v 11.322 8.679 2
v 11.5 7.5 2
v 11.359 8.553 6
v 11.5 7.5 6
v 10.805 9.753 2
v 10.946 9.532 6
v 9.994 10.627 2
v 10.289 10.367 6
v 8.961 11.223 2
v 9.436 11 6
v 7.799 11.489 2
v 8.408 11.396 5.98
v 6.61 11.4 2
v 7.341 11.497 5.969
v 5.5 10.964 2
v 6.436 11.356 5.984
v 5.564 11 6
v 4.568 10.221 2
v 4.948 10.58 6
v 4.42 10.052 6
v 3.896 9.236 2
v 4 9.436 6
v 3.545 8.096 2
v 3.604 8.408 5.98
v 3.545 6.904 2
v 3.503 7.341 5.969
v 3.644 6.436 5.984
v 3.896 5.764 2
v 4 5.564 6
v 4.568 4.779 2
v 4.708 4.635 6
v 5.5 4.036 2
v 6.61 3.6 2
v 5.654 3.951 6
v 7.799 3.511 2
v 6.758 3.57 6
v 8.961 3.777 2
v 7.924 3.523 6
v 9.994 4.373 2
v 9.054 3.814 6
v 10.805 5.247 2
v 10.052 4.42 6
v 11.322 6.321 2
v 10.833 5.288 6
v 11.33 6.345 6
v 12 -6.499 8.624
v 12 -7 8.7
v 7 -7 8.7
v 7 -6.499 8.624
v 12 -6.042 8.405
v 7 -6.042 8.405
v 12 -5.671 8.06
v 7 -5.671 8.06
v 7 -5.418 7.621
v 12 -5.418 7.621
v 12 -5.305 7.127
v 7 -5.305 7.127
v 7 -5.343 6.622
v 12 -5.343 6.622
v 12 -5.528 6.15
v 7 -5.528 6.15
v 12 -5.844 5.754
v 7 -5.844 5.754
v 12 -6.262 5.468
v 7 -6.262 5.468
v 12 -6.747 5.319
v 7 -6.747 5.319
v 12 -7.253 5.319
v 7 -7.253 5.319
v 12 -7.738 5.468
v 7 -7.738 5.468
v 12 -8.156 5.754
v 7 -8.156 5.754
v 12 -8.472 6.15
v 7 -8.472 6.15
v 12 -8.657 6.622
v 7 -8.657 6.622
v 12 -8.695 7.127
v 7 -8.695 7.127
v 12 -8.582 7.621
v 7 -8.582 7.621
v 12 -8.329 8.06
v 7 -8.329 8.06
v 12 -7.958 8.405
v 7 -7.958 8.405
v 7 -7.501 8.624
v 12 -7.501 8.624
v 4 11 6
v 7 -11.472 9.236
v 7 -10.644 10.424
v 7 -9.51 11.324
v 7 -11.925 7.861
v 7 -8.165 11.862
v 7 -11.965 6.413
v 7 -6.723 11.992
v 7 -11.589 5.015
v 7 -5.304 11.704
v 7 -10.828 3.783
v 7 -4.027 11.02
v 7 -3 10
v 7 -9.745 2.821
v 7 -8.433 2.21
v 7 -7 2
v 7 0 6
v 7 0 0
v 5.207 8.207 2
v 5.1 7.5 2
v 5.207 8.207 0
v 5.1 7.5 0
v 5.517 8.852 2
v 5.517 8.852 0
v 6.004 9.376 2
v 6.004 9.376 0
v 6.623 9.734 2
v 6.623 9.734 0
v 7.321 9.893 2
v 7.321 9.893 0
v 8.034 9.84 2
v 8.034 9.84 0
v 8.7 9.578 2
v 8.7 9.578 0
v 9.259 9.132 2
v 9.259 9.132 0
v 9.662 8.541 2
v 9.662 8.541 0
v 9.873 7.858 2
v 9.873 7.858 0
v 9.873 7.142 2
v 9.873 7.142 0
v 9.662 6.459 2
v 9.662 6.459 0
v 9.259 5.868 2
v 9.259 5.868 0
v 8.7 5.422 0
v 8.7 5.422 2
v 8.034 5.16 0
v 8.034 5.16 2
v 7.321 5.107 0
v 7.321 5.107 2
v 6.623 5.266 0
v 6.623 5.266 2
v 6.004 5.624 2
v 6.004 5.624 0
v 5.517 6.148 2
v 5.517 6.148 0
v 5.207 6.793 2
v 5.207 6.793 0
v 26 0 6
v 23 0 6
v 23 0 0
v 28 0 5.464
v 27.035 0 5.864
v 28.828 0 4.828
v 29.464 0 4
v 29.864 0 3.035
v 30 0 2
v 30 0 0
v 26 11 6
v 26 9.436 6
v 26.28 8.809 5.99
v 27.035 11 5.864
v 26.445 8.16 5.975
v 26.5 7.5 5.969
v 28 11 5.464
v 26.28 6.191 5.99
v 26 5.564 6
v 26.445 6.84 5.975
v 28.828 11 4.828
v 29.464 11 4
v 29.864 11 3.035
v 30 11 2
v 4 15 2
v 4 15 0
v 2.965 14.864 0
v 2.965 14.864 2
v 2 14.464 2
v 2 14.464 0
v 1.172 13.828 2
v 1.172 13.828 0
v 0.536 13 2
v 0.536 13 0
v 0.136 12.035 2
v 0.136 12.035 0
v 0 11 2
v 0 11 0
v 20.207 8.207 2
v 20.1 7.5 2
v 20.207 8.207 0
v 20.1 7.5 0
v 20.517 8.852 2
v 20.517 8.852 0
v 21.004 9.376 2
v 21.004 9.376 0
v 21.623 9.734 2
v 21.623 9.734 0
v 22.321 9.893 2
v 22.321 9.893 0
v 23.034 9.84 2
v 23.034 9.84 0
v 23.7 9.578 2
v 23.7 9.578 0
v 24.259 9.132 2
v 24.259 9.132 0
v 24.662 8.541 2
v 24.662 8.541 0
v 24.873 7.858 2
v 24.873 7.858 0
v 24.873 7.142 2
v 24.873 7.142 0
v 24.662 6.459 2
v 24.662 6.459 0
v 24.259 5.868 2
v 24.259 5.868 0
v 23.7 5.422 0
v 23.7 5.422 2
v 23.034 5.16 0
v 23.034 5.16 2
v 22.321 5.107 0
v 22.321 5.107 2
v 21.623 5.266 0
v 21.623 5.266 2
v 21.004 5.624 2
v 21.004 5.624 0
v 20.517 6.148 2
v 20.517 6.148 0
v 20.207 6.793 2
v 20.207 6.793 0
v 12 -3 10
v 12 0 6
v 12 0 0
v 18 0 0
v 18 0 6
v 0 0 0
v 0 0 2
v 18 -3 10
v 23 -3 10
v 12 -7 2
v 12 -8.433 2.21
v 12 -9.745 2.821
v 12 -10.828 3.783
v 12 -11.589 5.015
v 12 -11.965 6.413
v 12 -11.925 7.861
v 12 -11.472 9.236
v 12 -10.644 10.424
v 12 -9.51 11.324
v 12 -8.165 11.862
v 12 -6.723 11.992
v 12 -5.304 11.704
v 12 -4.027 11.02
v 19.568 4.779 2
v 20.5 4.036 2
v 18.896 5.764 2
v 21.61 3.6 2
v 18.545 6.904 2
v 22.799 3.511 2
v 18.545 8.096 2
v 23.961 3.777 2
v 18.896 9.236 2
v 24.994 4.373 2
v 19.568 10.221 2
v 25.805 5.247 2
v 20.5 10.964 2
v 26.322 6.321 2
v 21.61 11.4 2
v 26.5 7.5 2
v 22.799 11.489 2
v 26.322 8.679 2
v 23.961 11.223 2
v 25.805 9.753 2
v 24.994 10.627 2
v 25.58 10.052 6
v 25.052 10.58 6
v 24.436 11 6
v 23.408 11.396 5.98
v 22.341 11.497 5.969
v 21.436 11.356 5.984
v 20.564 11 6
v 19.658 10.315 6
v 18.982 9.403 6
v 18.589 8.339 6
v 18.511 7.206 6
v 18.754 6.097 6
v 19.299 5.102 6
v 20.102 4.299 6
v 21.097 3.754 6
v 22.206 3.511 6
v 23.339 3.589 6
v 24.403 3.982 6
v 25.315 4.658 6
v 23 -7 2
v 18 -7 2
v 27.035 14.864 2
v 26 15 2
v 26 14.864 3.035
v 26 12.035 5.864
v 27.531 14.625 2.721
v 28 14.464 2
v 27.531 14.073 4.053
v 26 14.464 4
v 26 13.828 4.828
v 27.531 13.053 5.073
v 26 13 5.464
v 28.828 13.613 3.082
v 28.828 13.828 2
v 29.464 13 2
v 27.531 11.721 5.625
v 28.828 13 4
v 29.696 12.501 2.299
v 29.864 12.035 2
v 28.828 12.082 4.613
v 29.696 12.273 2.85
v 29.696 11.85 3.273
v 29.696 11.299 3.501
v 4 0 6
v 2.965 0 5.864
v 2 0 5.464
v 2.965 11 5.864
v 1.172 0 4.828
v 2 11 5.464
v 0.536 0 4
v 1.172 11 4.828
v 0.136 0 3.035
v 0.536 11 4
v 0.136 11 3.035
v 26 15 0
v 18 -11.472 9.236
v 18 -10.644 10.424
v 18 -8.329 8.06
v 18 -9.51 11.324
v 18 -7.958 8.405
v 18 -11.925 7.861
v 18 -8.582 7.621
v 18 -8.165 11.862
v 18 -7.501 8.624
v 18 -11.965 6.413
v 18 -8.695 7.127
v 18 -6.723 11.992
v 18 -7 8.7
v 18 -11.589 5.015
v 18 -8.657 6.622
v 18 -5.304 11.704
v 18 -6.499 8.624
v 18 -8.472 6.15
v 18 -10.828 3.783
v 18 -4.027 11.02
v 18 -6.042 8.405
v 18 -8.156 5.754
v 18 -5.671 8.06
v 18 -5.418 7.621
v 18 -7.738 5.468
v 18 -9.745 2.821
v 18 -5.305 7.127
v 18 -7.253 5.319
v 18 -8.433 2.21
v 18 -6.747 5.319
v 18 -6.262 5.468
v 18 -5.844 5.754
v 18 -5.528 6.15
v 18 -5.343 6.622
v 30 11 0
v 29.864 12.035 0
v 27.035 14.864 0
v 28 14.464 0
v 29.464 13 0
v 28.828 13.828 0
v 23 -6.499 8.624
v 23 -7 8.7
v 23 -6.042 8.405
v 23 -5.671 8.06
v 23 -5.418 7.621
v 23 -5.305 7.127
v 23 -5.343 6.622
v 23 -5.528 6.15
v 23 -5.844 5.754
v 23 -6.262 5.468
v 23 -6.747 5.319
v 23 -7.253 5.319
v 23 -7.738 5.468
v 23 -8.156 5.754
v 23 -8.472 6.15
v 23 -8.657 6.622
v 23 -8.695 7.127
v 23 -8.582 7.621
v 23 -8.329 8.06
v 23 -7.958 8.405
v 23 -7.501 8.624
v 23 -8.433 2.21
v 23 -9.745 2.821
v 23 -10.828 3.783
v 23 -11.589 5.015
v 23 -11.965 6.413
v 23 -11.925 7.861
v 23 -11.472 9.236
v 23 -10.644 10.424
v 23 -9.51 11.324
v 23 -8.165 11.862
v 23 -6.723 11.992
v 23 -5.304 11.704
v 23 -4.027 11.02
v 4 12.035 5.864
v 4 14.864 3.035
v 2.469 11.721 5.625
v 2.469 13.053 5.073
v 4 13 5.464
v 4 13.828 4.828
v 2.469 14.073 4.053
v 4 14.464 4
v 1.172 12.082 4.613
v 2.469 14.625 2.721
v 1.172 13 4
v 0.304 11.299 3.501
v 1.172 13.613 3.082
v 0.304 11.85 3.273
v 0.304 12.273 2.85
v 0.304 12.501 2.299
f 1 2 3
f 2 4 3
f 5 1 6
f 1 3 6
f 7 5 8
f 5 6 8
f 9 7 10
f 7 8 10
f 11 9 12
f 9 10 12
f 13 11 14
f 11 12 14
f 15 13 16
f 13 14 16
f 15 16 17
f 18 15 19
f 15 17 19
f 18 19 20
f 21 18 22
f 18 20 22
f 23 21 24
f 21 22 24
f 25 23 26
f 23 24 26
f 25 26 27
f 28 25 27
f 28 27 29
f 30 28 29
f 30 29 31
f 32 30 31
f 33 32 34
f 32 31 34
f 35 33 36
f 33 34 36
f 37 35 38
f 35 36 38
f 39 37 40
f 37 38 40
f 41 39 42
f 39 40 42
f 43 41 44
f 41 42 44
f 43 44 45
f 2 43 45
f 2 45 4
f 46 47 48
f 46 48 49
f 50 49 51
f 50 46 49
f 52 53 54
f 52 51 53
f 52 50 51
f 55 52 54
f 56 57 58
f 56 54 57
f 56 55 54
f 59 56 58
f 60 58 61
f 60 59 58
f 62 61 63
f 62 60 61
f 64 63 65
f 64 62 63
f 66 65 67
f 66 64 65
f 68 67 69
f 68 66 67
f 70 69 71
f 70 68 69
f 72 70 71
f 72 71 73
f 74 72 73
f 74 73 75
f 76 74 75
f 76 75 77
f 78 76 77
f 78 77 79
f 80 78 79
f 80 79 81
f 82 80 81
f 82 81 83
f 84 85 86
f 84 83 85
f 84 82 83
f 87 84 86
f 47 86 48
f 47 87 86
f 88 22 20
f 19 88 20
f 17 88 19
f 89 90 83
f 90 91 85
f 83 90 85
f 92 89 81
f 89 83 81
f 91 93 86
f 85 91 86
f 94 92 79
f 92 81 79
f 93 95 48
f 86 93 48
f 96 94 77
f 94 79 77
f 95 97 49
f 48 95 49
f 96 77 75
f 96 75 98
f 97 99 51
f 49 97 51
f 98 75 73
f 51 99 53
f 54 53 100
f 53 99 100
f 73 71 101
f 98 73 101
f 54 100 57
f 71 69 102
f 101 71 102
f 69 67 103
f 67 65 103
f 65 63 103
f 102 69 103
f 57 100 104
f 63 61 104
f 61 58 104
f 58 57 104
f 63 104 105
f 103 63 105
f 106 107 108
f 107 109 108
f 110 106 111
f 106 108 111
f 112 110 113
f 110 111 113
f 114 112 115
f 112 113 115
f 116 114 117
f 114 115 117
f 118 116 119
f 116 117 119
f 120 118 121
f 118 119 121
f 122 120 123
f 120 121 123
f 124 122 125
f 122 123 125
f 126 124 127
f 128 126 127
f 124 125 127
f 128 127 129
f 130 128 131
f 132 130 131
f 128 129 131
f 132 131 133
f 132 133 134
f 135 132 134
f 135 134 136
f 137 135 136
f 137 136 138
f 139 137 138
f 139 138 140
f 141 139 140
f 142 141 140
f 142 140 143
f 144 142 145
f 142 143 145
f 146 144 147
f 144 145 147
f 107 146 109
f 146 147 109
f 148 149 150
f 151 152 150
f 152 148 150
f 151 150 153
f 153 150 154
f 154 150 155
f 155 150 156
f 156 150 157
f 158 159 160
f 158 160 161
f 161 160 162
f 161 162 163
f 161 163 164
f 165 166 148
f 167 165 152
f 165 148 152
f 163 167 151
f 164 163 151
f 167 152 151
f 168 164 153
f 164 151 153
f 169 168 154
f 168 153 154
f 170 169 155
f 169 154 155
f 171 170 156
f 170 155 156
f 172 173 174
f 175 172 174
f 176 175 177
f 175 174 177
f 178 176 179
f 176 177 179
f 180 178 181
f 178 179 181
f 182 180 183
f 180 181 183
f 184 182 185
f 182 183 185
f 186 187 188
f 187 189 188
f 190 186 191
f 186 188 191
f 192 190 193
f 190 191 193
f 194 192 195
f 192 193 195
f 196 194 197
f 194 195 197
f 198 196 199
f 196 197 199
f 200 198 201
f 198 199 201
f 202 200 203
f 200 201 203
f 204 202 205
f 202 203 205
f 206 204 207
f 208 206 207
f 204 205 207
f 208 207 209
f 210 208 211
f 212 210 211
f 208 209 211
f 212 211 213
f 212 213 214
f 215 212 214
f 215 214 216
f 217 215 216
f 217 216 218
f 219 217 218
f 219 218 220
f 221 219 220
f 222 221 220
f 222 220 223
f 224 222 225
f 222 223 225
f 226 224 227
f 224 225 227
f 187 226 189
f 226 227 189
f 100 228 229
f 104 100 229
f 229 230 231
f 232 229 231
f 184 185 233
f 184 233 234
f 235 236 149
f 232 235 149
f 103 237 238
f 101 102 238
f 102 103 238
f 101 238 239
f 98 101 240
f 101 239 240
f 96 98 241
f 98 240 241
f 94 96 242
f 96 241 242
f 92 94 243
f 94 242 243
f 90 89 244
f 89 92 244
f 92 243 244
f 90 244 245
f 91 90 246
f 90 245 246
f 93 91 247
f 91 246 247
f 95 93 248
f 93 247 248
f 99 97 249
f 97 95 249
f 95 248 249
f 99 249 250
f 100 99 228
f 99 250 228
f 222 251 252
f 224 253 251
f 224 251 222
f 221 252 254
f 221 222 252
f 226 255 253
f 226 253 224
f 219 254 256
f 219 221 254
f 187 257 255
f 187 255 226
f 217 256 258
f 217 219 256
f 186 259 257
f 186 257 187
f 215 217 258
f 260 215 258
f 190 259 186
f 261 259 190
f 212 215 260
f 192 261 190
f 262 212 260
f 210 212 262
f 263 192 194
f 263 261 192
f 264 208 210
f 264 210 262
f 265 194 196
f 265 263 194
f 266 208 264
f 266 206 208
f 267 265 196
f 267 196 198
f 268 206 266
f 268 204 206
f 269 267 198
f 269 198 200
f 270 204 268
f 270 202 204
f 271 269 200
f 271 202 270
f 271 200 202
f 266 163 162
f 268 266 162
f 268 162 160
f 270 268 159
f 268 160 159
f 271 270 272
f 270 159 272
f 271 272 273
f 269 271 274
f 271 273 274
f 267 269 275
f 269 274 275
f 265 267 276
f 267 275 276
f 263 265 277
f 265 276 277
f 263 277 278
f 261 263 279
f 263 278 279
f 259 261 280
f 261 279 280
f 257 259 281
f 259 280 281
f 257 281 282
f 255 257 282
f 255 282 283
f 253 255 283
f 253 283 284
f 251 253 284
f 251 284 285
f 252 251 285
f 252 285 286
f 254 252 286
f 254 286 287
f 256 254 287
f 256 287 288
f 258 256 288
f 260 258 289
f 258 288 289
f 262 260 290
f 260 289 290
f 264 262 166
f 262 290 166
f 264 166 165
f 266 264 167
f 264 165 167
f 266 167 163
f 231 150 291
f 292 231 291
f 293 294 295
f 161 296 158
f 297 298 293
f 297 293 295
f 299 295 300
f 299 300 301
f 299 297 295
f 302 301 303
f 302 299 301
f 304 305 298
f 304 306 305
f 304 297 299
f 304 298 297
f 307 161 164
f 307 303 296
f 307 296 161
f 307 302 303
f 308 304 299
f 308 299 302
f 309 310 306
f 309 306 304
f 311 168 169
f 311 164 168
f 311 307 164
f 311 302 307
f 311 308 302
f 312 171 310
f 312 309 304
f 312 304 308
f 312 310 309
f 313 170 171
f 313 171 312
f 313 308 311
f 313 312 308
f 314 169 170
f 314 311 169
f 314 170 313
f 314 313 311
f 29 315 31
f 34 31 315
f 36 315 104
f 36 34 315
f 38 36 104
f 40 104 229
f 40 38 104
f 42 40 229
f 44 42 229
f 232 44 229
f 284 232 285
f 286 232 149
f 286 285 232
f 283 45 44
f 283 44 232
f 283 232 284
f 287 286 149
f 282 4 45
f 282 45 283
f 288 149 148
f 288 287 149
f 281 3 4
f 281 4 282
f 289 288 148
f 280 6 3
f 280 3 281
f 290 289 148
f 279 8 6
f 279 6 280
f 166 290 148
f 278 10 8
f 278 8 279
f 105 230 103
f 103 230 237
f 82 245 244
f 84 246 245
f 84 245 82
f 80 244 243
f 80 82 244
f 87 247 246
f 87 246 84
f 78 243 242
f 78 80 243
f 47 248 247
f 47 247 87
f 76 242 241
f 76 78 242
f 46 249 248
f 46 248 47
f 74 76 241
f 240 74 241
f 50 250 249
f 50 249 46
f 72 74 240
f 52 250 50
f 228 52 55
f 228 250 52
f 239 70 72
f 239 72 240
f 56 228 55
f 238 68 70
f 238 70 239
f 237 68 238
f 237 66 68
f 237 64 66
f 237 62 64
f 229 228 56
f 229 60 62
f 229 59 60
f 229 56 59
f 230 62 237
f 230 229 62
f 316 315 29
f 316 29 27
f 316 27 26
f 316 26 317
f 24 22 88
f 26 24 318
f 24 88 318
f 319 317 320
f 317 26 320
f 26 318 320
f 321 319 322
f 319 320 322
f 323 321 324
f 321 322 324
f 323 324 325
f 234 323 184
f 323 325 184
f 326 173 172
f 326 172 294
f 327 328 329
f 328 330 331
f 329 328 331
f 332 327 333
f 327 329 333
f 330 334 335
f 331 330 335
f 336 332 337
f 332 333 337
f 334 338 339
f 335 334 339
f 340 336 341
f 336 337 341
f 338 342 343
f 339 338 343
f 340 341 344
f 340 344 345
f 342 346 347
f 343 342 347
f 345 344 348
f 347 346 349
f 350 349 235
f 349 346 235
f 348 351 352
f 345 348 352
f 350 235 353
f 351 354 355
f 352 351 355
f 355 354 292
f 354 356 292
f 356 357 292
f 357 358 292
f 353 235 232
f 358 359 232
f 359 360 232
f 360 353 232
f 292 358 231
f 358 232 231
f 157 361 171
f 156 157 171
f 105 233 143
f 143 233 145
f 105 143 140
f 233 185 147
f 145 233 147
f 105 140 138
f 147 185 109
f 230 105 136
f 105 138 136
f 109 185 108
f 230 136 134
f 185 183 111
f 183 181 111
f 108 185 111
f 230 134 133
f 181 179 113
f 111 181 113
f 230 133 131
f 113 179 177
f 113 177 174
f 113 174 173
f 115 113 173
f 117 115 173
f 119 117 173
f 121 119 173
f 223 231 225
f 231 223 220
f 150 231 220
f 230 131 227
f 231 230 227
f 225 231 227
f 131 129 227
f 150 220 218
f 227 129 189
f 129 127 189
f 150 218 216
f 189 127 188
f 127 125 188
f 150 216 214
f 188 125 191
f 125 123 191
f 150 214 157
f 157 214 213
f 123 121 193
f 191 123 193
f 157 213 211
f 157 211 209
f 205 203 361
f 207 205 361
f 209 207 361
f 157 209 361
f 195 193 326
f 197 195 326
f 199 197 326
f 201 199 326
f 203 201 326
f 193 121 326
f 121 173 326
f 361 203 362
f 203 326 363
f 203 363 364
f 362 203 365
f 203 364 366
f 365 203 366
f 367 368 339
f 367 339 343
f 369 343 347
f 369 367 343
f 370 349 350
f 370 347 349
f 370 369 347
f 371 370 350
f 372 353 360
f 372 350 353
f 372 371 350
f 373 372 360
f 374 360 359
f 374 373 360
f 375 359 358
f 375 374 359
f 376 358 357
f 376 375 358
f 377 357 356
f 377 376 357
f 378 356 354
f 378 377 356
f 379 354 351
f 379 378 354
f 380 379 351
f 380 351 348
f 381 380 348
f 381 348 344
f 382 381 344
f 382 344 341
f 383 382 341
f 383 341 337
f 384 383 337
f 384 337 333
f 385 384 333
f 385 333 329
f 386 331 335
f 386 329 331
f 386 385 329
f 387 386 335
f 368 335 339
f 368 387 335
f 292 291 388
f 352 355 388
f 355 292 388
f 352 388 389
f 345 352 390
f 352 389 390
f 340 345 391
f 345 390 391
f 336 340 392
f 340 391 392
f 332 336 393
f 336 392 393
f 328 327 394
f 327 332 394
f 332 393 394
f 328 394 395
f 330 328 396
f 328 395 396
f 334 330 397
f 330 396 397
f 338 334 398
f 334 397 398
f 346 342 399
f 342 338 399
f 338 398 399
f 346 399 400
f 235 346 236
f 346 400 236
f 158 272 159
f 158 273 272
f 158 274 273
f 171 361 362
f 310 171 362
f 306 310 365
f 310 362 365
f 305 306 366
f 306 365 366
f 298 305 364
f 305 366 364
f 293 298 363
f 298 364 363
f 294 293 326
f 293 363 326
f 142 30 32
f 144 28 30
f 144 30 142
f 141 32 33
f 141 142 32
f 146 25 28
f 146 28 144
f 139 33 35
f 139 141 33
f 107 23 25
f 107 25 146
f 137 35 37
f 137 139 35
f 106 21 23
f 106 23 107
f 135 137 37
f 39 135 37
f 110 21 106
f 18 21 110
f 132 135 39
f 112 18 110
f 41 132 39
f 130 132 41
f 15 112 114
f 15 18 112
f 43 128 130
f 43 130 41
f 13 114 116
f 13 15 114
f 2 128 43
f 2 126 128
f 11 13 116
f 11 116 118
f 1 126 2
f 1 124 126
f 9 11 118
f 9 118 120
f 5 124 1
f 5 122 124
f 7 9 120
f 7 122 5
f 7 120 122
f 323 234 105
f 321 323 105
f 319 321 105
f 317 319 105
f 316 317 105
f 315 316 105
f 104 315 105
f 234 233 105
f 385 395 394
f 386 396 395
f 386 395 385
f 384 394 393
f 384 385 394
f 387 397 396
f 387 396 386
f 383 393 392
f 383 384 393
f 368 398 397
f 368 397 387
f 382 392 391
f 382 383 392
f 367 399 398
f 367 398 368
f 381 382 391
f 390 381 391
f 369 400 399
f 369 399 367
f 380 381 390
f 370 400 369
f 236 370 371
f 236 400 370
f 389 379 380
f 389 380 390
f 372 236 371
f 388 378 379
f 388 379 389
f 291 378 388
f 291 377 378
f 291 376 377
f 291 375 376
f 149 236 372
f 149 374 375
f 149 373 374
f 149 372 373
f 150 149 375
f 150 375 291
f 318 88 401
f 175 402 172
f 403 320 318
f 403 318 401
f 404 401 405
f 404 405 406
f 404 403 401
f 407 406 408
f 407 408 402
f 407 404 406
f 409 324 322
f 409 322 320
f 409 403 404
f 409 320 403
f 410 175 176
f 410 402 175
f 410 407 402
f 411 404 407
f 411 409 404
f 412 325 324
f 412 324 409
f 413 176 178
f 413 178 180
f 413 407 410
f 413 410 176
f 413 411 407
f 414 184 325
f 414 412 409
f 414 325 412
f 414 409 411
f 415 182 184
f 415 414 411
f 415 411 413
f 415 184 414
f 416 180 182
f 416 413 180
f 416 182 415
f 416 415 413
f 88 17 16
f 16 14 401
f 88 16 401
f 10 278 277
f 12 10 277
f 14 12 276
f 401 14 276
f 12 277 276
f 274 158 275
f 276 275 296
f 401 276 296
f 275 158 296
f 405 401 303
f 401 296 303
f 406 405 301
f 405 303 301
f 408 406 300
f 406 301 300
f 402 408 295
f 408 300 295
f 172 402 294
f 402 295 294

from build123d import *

# Parameters (mm, degrees)
SKETCH2_W                      = 30
SKETCH2_H                      = 15
BOSS_EXTRUDE1_DEPTH            = 6
CBORE_FOR_M4_SHCS1_D           = 4.8
CBORE_FOR_M4_SHCS1_CBORE_D     = 8
CBORE_FOR_M4_SHCS1_CBORE_DEPTH = 4
BOSS_EXTRUDE2_DEPTH            = 30
CUT_EXTRUDE1_START             = -15
SKETCH6_W                      = 6
SKETCH6_H                      = 18.030958188
SKETCH6_W_2                    = 16.282501636
SKETCH6_H_2                    = 17.921679654
SKETCH6_W_3                    = 7
SKETCH6_H_3                    = 20.435085946
CUT_EXTRUDE1_DEPTH             = 28.107006543
CUT_EXTRUDE2_DEPTH             = 30.966648128
CUT_EXTRUDE2_DEPTH_BACK        = 30.966648128
SKETCH7_R                      = 1.7
FILLET1_R                      = 4


with BuildPart() as part:
    # Sketch2 → Boss-Extrude1 (new body)
    with BuildSketch(Plane.XY):
        with Locations((15, 7.5)):
            Rectangle(SKETCH2_W, SKETCH2_H)
    extrude(amount=BOSS_EXTRUDE1_DEPTH)

    # CBORE for M4 SHCS1 (through all)
    with Locations(Plane.XY.offset(6)):
        with Locations((7.5, 7.5), (22.5, 7.5)):
            CounterBoreHole(CBORE_FOR_M4_SHCS1_D / 2, CBORE_FOR_M4_SHCS1_CBORE_D / 2, CBORE_FOR_M4_SHCS1_CBORE_DEPTH)

    # Sketch5 → Boss-Extrude2 (add)
    with BuildSketch(Plane(origin=(30, 0, 0), x_dir=(0, 0, -1), z_dir=(1, 0, 0))):
        with BuildLine():
            Line((0, 0), (-2, -7))
            ThreePointArc((-2, -7), (-9.236067977, -11.472135955), (-10, -3))
            Line((-10, -3), (-6, 0))
            Line((-6, 0), (0, 0))
        make_face()
    extrude(amount=-BOSS_EXTRUDE2_DEPTH)

    # Sketch6 → Cut-Extrude1 (cut, through all)
    with BuildSketch(Plane(origin=(0, 15, 0), x_dir=(1, 0, 0), z_dir=(0, 1, 0)).offset(CUT_EXTRUDE1_START)):
        with Locations((15, -4.71597722)):
            Rectangle(SKETCH6_W, SKETCH6_H)
        with Locations((-1.141250818, -5.644844763)):
            Rectangle(SKETCH6_W_2, SKETCH6_H_2)
        with Locations((26.5, -5.918041099)):
            Rectangle(SKETCH6_W_3, SKETCH6_H_3)
    extrude(amount=-CUT_EXTRUDE1_DEPTH, mode=Mode.SUBTRACT)

    # Sketch7 → Cut-Extrude2 (cut, two sides: drawn at the far end of the back side and taken through both)
    with BuildSketch(Plane.ZY.offset(-7).offset(-CUT_EXTRUDE2_DEPTH_BACK)):
        with Locations((7, -7)):
            Circle(SKETCH7_R)
    extrude(amount=CUT_EXTRUDE2_DEPTH + CUT_EXTRUDE2_DEPTH_BACK, mode=Mode.SUBTRACT)

    # Fillet1
    # the kernel refuses this fillet: 4 mm, written as the material it takes off along each edge
    with BuildSketch(Plane(origin=(26, 11, 2), x_dir=(0, 0, 1), z_dir=(1, 0, 0))) as fillet1_piece_1_section:
        Polygon((0, 0), (FILLET1_R, 0), (FILLET1_R, -FILLET1_R), (0, -FILLET1_R), align=None)
    fillet1_piece_1 = extrude(amount=FILLET1_R, mode=Mode.PRIVATE)
    fillet1_piece_1 = fillet1_piece_1 - Plane(origin=(26, 11, 2), x_dir=(0, -0.7071067811865475, -0.7071067811865475), z_dir=(1, 0, 0)) * Sphere(FILLET1_R, mode=Mode.PRIVATE)
    add(fillet1_piece_1, mode=Mode.SUBTRACT)
    with BuildSketch(Plane(origin=(4, 11, 2), x_dir=(0, 0, 1), z_dir=(-1, 0, 0))) as fillet1_piece_2_section:
        Polygon((0, 0), (FILLET1_R, 0), (FILLET1_R, FILLET1_R), (0, FILLET1_R), align=None)
    fillet1_piece_2 = extrude(amount=FILLET1_R, mode=Mode.PRIVATE)
    fillet1_piece_2 = fillet1_piece_2 - Plane(origin=(4, 11, 2), x_dir=(0, -0.7071067811865475, -0.7071067811865475), z_dir=(-1, 0, 0)) * Sphere(FILLET1_R, mode=Mode.PRIVATE)
    add(fillet1_piece_2, mode=Mode.SUBTRACT)
    with BuildSketch(Plane(origin=(30, -10, 6), x_dir=(-1, 0, 0), z_dir=(0, 1, 0))) as fillet1_piece_3:
        with BuildLine():
            CenterArc((FILLET1_R, -FILLET1_R), FILLET1_R, 90, 90)
            Line((0, -FILLET1_R), (0, 0))
            Line((0, 0), (FILLET1_R, 0))
        make_face()
    extrude(amount=21, mode=Mode.SUBTRACT)
    with BuildSketch(Plane(origin=(26, 15, 6), x_dir=(0, -1, 0), z_dir=(-1, 0, 0))) as fillet1_piece_4:
        with BuildLine():
            CenterArc((FILLET1_R, -FILLET1_R), FILLET1_R, 90, 90)
            Line((0, -FILLET1_R), (0, 0))
            Line((0, 0), (FILLET1_R, 0))
        make_face()
    extrude(amount=22, mode=Mode.SUBTRACT)
    with BuildSketch(Plane(origin=(0, 11, 6), x_dir=(0, 0, -1), z_dir=(0, -1, 0))) as fillet1_piece_5:
        with BuildLine():
            CenterArc((FILLET1_R, FILLET1_R), FILLET1_R, 180, 90)
            Line((0, FILLET1_R), (0, 0))
            Line((0, 0), (FILLET1_R, 0))
        make_face()
    extrude(amount=21, mode=Mode.SUBTRACT)
    with BuildSketch(Plane(origin=(0, 15, -10), x_dir=(0, -1, 0), z_dir=(0, 0, 1)), Plane(origin=(30, 15, -10), x_dir=(-1, 0, 0), z_dir=(0, 0, 1))) as fillet1_piece_6:
        with BuildLine():
            CenterArc((FILLET1_R, FILLET1_R), FILLET1_R, 180, 90)
            Line((0, FILLET1_R), (0, 0))
            Line((0, 0), (FILLET1_R, 0))
        make_face()
    extrude(amount=12, mode=Mode.SUBTRACT)


solid = part.part
